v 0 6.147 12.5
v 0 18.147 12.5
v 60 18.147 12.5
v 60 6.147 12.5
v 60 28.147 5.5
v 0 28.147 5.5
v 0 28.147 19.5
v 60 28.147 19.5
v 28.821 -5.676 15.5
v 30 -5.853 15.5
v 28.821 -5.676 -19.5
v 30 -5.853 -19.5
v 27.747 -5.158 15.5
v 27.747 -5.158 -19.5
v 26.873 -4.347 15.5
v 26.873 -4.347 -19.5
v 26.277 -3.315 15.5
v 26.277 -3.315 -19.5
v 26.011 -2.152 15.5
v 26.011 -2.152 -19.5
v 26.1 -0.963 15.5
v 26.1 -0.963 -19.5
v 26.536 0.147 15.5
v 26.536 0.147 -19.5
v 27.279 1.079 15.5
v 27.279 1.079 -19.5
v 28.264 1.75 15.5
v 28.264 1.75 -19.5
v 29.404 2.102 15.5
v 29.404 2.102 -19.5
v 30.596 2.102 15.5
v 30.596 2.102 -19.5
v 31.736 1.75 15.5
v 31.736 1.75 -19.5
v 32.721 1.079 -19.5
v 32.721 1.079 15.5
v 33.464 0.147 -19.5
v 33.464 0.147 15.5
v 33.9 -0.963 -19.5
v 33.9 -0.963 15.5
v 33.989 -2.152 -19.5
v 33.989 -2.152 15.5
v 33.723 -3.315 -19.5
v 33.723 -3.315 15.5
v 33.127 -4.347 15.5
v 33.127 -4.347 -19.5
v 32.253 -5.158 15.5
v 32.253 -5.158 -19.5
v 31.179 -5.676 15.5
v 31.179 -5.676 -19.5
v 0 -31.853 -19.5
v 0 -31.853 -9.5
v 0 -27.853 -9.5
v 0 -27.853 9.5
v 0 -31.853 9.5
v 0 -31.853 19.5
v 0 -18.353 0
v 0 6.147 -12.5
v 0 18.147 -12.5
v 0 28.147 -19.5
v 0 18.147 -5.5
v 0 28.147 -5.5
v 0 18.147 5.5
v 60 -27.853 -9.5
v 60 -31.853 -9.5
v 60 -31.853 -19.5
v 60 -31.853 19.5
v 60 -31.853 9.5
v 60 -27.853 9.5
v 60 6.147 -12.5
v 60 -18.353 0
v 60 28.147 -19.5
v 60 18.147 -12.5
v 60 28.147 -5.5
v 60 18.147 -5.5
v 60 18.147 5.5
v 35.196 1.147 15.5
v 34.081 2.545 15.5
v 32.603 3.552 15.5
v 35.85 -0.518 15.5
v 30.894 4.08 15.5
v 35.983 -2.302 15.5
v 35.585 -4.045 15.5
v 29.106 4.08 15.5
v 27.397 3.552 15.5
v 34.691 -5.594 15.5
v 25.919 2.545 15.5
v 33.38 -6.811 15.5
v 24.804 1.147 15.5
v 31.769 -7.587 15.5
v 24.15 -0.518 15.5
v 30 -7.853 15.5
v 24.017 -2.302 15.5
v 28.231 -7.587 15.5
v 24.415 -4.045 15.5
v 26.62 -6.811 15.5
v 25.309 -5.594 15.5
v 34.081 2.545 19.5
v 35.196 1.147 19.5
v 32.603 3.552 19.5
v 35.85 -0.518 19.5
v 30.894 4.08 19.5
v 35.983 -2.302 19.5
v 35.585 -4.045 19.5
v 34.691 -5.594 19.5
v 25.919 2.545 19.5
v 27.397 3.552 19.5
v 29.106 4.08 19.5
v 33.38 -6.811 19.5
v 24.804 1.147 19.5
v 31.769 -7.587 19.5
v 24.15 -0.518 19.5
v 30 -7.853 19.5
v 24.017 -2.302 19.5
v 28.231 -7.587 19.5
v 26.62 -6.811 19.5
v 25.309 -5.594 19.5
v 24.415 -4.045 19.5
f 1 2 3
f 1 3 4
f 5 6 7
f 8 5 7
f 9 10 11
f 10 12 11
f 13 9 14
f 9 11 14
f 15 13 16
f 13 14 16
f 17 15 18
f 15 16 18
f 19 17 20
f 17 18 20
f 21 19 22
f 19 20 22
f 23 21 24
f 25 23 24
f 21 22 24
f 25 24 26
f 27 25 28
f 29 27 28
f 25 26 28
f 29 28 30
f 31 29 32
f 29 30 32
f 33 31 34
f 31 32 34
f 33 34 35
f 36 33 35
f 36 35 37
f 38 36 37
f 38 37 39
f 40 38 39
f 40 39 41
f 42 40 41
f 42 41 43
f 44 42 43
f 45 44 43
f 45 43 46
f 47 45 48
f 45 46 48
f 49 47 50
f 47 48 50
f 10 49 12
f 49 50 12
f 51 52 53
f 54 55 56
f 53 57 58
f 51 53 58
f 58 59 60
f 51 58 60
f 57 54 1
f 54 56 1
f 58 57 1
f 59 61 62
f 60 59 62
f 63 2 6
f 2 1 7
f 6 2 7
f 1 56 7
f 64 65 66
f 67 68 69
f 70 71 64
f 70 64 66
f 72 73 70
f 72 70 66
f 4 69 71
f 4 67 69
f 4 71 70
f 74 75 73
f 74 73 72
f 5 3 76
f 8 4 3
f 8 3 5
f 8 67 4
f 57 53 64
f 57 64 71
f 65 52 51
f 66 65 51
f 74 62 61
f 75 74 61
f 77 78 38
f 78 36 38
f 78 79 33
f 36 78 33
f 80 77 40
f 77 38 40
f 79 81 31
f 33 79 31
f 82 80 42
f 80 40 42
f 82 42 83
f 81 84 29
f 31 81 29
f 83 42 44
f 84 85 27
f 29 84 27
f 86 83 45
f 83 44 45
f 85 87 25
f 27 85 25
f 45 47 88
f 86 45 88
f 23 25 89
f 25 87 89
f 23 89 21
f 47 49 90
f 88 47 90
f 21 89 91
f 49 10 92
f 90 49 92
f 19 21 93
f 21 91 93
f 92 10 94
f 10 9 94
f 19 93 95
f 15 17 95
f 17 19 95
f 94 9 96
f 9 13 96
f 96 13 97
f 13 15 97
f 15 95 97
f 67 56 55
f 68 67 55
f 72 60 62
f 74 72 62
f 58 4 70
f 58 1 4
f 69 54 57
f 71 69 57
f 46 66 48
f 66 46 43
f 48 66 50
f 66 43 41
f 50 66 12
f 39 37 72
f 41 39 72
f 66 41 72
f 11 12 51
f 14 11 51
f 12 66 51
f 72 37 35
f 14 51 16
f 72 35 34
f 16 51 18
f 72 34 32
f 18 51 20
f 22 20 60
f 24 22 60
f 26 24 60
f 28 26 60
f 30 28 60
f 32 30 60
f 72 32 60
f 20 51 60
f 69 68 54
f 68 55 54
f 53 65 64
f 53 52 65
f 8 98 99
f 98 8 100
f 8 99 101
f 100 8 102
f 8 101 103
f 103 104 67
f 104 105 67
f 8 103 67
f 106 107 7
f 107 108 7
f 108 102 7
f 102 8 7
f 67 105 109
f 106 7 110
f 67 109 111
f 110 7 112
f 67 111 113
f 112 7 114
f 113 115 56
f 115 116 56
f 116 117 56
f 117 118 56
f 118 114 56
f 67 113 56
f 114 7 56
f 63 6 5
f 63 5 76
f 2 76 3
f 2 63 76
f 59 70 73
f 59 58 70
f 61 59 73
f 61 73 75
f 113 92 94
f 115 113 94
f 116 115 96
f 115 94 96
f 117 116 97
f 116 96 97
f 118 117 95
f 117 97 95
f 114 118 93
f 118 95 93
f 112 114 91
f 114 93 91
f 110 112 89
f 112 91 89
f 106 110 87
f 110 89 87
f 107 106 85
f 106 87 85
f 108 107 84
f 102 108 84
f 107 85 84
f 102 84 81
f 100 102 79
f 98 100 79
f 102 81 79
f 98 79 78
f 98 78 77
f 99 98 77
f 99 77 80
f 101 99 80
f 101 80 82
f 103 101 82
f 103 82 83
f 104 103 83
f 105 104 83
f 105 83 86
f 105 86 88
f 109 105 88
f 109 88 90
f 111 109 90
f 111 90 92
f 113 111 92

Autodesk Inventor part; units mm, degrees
ref_plane "YZ Plane" through (0, 0, 0) normal (1, 0, 0) x (0, 1, 0)
ref_plane "XZ Plane" through (0, 0, 0) normal (0, 1, 0) x (-1, 0, 0)
ref_plane "XY Plane" through (0, 0, 0) normal (0, 0, 1) x (1, 0, 0)
sketch "Szkic1" plane through (0, 0, 0) normal (1, 0, 0) x (0, 1, 0)
  line L0 (28.1466, 19.5) -> (-31.8534, 19.5)
  line L1 (-31.8534, 19.5) -> (-31.8534, -19.5)
  line L2 (-31.8534, -19.5) -> (28.1466, -19.5)
  line L3 (28.1466, -19.5) -> (28.1466, 19.5)
  line L4 (28.1466, 0) -> (28.1466, 5.5)
  line L5 (28.1466, 5.5) -> (6.1466, 5.5)
  line L6 (6.1466, 5.5) -> (6.1466, 0)
  line L7 (28.1466, -5.5) -> (6.1466, -5.5)
  line L8 (6.1466, -5.5) -> (6.1466, 0)
  line L9 (18.1466, 12.5) -> (6.1466, 12.5)
  line L10 (6.1466, 12.5) -> (6.1466, -12.5)
  line L11 (6.1466, -12.5) -> (18.1466, -12.5)
  line L12 (18.1466, -12.5) -> (18.1466, 12.5)
  line L13 (-31.8534, 9.5) -> (-27.8534, 9.5)
  line L14 (-27.8534, 9.5) -> (-18.3534, 0)
  line L15 (-31.8534, 0) -> (0, 0)
  line L16 (-31.8534, -9.5) -> (-27.8534, -9.5)
  line L17 (-27.8534, -9.5) -> (-18.3534, 0)
  point P0 (12.1466, 0)
  point P1 (6.1466, 2.75)
  point P2 (18.1466, -5.5)
  point P3 (6.1466, -5.5)
  point P4 (18.1466, 5.5)
  dimension "d0" = 60
  dimension "d1" = 39
  dimension "d2" = 22
  dimension "d4" = 12
  dimension "d5" = 25
  dimension "d6" = 135
  dimension "d7" = 10
  dimension "d8" = 4
  dimension "d9" = 9.5
extrude "Wyciągnięcie proste1" add sketch "Szkic1" along normal blind 60 contours L3 L5 L12 L9 L10 L6 L8 L11 L7 L2 L1 L16 L17 L14 L13 L0
sketch "Szkic2" plane through (0, -31.8534, 19.5) normal (0, 0, 1) x (1, 0, 0)
  point P0 (0, 31.8534)
  point P1 (30, 30)
hole "Otwór1" at (30, -1.8534, 19.5) direction (0, 0, -1) diameter 8 end through all counterbore diameter 12 counterbore depth 4
